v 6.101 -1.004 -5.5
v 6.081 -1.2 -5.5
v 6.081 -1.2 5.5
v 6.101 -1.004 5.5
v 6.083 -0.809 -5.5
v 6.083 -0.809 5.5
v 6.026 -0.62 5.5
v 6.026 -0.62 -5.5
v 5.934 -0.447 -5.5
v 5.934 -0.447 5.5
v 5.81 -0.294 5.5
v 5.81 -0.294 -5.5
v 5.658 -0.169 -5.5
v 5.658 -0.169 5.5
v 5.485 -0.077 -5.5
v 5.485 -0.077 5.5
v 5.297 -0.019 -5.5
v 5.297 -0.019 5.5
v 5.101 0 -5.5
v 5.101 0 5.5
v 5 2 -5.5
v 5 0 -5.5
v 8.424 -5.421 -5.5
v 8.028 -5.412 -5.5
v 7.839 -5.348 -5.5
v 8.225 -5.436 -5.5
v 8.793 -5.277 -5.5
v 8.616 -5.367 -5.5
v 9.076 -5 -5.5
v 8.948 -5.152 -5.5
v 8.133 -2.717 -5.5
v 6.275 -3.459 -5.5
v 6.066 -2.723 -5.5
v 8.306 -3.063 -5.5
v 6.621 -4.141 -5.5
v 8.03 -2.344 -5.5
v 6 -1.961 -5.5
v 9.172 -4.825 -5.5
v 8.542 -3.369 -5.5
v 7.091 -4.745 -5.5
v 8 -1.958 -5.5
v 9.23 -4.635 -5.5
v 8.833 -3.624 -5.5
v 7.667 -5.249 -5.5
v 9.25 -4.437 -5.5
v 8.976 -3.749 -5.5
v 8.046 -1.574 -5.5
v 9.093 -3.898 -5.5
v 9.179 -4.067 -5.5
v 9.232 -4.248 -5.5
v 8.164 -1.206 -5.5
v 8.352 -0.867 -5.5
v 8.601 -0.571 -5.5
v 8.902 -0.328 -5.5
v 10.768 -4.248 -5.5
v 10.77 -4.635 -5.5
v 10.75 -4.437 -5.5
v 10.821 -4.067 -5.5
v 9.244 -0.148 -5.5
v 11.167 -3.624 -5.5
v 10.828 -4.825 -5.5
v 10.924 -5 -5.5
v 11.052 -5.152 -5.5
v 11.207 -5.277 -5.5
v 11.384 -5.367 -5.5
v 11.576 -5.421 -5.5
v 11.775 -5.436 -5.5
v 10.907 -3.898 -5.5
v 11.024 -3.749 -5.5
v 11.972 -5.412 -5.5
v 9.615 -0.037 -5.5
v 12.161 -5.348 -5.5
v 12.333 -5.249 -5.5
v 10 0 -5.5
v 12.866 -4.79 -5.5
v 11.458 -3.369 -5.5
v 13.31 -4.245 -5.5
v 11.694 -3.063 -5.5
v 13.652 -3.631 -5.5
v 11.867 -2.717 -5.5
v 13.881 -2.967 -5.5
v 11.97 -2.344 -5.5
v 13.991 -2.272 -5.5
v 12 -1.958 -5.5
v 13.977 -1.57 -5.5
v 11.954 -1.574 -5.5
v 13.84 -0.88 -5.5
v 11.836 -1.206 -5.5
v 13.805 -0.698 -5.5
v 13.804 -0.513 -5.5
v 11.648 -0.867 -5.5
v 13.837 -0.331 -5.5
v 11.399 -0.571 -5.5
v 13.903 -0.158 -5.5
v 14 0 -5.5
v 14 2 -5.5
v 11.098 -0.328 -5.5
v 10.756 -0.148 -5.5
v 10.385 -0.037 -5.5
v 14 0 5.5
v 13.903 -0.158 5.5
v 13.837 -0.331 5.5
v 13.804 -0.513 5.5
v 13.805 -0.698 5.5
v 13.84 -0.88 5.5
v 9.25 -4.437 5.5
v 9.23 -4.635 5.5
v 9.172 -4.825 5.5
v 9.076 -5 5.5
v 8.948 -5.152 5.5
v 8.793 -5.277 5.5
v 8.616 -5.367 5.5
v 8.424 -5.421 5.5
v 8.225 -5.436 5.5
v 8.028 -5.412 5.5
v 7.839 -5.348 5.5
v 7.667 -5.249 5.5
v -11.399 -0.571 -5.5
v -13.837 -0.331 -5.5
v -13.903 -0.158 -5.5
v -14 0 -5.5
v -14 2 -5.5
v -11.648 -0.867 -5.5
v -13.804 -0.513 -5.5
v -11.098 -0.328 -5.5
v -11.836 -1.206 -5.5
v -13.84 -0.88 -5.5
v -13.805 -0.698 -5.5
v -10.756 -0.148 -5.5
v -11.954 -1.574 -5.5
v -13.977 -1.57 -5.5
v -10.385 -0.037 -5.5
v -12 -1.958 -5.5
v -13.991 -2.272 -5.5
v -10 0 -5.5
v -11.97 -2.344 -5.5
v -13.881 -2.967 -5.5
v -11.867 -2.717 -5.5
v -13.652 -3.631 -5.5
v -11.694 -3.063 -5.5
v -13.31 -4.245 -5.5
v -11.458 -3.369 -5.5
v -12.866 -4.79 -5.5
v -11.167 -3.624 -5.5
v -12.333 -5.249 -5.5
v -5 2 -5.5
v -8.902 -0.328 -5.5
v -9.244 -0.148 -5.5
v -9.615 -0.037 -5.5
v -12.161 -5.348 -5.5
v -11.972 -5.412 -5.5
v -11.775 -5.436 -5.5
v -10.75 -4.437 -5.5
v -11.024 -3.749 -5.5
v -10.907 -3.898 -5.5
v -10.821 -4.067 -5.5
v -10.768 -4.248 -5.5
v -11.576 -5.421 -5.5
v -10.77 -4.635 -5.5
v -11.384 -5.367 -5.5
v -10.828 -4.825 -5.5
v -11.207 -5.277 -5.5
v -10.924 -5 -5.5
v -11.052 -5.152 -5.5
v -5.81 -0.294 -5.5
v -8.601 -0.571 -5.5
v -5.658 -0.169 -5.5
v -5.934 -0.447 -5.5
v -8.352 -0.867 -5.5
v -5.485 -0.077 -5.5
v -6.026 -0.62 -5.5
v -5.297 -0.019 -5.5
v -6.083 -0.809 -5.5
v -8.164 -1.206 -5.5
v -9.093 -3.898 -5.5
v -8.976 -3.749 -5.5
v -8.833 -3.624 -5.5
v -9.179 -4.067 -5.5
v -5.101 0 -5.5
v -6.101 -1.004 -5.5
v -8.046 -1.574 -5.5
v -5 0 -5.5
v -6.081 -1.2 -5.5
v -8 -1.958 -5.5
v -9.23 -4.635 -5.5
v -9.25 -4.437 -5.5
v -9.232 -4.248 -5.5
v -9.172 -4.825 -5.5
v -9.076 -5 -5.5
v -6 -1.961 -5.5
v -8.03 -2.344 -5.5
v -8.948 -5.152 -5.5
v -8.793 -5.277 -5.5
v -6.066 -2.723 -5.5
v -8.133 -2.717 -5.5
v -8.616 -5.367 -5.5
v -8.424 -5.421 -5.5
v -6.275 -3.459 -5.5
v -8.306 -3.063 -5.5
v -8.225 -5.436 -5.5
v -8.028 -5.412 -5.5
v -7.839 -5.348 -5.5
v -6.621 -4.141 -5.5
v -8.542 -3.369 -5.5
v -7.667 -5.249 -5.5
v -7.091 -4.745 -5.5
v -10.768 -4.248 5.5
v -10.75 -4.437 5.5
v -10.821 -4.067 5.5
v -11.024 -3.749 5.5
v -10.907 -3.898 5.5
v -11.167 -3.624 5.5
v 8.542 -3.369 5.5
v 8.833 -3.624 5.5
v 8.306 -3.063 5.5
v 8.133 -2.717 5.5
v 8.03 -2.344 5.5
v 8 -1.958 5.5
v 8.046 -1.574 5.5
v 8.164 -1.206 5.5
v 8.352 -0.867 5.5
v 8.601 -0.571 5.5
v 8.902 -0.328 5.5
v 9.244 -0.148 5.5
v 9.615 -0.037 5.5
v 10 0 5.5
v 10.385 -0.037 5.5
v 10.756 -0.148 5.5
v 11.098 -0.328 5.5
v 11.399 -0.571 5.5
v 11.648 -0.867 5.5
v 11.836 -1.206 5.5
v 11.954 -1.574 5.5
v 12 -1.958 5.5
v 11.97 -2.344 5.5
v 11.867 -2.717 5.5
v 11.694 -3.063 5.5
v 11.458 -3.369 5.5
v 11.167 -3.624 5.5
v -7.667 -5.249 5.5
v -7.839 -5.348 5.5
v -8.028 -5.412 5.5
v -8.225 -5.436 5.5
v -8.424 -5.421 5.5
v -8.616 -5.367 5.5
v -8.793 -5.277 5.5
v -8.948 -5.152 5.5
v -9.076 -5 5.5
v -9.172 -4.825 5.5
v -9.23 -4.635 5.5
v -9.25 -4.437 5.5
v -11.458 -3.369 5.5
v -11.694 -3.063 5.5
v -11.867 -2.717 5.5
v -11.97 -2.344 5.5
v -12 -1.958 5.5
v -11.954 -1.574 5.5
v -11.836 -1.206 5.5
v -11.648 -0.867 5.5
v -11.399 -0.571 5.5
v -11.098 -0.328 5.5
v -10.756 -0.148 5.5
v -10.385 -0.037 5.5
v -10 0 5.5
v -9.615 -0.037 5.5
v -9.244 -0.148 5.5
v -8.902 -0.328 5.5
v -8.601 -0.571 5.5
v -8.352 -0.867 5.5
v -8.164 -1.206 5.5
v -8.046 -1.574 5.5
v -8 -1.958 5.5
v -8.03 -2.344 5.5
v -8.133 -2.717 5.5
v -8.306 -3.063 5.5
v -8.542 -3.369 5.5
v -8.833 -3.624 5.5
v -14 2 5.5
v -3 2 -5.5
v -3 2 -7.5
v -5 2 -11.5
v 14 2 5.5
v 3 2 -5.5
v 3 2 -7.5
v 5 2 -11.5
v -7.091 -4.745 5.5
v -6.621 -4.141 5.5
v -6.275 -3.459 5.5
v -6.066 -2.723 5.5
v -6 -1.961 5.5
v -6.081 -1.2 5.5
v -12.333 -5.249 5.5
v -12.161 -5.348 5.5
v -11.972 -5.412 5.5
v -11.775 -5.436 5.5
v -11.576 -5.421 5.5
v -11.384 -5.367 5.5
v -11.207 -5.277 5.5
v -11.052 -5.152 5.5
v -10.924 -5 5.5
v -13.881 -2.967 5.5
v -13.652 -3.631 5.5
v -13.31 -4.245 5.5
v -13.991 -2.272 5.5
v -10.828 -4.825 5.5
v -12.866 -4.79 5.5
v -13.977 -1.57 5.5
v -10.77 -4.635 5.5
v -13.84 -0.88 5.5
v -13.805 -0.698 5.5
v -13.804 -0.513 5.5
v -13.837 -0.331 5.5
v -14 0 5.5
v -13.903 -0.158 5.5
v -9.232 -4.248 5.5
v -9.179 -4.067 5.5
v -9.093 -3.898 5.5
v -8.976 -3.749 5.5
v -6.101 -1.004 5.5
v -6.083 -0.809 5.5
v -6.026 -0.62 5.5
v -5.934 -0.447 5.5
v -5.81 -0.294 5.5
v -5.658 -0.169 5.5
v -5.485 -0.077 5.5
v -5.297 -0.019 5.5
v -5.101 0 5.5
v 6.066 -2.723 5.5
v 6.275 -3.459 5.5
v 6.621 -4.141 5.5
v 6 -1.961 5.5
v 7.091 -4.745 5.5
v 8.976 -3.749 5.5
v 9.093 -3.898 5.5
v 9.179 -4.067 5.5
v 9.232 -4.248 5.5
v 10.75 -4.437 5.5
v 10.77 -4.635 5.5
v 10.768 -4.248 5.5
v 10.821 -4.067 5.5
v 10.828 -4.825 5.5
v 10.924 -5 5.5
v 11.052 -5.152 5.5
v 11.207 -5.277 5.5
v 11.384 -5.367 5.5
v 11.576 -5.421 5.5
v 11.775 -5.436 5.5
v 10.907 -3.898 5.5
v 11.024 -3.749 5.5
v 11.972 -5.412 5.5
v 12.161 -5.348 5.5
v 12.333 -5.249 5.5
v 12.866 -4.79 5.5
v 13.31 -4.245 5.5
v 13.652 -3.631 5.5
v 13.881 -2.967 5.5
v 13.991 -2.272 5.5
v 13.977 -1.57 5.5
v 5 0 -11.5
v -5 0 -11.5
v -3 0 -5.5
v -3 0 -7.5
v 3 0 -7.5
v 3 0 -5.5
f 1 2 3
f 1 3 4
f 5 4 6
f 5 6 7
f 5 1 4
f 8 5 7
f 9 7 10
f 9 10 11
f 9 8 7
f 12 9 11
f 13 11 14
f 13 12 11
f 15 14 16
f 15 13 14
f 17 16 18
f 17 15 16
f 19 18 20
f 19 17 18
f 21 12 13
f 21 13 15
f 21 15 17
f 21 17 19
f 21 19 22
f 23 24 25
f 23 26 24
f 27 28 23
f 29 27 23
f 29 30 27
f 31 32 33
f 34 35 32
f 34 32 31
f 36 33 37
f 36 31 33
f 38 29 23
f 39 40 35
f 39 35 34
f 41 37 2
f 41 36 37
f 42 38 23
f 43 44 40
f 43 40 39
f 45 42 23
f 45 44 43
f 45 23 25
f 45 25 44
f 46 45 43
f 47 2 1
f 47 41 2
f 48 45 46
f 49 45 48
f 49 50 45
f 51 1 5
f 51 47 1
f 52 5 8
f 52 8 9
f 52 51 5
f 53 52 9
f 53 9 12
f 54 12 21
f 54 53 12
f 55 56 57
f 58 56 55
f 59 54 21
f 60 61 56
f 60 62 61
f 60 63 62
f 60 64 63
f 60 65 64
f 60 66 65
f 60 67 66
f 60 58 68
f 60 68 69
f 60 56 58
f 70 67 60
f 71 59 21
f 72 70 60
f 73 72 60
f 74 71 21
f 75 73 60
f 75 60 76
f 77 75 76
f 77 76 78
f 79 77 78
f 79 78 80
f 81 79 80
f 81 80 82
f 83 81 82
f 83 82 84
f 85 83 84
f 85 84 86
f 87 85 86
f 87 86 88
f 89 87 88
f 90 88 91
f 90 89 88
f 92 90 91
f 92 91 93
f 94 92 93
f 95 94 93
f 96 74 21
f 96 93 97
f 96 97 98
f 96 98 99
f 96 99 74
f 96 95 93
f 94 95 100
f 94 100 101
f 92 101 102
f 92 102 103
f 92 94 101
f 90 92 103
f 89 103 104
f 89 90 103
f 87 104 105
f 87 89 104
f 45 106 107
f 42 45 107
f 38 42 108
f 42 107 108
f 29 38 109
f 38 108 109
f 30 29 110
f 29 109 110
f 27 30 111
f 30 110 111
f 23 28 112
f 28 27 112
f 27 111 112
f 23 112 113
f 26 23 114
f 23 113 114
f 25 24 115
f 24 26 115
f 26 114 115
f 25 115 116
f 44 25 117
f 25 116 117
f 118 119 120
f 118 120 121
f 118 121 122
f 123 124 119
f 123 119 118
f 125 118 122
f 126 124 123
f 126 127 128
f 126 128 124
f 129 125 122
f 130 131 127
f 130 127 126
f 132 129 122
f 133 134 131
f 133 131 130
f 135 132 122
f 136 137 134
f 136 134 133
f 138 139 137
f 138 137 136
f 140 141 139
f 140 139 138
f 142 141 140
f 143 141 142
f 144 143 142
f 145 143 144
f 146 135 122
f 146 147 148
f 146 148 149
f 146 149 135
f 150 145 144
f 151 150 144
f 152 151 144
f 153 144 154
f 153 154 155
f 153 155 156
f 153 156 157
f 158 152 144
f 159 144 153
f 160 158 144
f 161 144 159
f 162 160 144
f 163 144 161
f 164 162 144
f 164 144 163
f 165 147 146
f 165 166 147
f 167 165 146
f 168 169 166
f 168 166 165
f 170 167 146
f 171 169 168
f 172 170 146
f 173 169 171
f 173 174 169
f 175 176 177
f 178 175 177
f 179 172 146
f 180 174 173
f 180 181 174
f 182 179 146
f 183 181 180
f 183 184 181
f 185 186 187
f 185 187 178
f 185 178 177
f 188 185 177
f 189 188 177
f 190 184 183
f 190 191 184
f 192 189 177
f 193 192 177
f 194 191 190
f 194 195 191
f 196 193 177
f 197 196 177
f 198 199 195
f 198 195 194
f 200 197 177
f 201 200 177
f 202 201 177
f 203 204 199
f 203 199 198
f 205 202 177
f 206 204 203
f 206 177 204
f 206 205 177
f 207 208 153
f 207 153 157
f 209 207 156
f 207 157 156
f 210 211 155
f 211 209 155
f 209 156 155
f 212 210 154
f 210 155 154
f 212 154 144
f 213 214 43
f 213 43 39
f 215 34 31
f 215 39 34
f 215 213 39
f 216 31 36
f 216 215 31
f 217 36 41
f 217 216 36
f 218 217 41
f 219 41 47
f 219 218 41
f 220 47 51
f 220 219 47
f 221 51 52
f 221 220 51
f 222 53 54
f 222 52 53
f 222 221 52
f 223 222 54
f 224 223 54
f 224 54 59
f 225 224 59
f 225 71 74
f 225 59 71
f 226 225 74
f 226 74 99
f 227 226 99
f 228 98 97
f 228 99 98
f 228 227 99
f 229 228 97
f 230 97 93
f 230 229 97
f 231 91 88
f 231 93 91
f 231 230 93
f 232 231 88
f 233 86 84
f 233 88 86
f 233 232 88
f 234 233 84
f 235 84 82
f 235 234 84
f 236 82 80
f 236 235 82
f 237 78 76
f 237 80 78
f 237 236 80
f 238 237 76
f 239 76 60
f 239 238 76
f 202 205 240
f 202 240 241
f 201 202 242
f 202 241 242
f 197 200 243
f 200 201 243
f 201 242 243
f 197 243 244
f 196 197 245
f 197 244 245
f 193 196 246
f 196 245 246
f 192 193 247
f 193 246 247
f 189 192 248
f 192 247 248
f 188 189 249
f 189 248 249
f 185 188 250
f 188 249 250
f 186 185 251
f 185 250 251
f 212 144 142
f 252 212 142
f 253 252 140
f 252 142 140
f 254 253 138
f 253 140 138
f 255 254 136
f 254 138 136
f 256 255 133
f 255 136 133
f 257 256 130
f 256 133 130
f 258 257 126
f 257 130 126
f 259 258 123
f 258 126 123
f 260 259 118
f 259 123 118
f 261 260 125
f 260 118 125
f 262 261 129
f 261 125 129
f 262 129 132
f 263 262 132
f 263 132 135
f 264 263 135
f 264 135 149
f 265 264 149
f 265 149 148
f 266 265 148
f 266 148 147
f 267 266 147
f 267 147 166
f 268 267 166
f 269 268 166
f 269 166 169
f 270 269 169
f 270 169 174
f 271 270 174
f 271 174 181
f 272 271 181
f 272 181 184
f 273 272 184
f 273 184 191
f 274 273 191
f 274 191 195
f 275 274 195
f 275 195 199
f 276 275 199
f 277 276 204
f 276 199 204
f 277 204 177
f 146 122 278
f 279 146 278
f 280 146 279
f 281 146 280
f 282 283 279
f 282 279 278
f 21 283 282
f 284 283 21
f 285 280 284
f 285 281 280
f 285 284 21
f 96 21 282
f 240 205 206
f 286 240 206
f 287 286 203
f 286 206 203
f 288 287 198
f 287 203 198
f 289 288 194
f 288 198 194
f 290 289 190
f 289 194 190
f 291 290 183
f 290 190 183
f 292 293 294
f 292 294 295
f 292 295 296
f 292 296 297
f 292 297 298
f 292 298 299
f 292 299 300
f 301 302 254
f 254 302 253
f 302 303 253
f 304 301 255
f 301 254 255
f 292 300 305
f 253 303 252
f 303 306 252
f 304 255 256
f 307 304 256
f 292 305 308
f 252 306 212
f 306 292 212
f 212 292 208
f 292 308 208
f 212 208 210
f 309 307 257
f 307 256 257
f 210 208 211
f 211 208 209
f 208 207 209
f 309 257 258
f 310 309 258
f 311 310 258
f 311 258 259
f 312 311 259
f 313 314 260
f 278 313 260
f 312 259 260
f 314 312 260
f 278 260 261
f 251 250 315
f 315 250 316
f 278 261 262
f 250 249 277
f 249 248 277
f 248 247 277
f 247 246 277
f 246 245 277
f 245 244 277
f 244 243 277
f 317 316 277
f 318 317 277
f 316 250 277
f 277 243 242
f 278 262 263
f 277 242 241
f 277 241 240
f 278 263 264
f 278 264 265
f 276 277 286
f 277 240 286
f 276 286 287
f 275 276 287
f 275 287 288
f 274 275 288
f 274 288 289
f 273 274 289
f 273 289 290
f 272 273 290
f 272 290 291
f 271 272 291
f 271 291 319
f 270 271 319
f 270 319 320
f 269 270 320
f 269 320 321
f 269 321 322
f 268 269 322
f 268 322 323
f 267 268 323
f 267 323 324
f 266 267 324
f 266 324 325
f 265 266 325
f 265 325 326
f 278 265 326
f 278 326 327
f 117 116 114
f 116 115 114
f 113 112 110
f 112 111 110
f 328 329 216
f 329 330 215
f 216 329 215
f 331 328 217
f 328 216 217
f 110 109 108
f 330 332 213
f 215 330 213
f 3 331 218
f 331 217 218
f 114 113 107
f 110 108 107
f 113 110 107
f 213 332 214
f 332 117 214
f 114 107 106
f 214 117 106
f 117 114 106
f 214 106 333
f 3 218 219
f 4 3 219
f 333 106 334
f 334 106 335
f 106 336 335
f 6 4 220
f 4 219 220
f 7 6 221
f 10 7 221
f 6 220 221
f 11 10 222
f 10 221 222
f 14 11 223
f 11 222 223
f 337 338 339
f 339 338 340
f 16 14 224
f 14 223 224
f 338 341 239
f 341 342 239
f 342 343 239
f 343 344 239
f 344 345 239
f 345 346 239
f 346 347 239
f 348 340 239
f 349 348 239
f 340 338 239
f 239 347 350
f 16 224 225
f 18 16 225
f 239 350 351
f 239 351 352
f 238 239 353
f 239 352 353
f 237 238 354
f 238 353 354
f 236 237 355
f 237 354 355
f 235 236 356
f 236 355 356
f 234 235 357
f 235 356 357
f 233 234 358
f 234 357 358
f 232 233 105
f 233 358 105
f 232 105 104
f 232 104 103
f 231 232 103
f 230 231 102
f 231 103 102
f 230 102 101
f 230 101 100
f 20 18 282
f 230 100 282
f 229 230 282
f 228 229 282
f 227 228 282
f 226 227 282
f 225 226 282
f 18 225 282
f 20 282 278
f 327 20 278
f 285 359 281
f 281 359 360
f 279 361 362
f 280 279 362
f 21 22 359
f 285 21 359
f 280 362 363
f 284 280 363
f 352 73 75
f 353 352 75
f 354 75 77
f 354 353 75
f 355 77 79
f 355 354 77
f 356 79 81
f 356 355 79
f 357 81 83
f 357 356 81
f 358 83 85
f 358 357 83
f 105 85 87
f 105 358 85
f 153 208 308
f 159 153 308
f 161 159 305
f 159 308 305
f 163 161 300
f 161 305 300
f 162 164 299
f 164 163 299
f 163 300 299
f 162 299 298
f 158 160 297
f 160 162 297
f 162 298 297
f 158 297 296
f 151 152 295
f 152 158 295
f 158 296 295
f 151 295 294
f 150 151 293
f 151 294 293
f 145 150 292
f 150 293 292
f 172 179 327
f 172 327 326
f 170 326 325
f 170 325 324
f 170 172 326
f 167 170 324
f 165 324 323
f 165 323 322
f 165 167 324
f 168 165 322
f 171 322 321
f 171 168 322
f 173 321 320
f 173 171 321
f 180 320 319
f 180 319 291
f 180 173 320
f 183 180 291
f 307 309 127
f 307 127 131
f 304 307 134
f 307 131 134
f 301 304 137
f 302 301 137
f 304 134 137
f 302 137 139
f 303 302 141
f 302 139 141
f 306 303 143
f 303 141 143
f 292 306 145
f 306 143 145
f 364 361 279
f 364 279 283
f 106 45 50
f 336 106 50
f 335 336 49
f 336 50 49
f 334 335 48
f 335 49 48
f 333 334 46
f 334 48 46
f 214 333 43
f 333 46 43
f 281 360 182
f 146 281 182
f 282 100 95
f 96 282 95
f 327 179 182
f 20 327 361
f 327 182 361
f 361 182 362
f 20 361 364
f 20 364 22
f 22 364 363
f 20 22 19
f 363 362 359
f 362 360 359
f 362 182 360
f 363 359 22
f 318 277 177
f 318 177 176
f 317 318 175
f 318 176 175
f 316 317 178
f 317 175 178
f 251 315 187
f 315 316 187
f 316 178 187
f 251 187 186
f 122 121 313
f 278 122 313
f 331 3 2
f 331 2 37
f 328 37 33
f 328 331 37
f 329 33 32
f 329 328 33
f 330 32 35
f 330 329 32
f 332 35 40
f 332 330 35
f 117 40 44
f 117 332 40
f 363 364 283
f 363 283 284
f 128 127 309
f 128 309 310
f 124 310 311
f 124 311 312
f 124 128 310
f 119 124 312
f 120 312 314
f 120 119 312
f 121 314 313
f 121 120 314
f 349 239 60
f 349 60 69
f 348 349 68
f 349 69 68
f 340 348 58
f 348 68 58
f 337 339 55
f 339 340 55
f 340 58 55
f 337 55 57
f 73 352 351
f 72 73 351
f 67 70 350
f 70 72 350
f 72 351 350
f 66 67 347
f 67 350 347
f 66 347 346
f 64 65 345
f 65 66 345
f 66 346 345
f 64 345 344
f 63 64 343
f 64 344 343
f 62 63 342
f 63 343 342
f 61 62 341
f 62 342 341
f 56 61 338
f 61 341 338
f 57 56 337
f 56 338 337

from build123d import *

# Parameters (mm, degrees)
SKETCH1_W           = 6
SKETCH1_H           = 2
BOSS_EXTRUDE1_DEPTH = 2
BOSS_EXTRUDE2_DEPTH = 5.5
FILLET1_R           = 1


with BuildPart() as part:
    # Sketch1 → Boss-Extrude1 (new body)
    with BuildSketch(Plane(origin=(0, 0, 0), x_dir=(1, 0, 0), z_dir=(0, 1, 0))):
        Polygon((-14, 5.5), (-14, -5.5), (14, -5.5), (14, 5.5), (5, 5.5), (5, 11.5), (-5, 11.5), (-5, 5.5), align=None)
        with Locations((0, 6.5)):
            Rectangle(SKETCH1_W, SKETCH1_H, mode=Mode.SUBTRACT)
    extrude(amount=BOSS_EXTRUDE1_DEPTH)

    # Sketch2 → Boss-Extrude2 (add, symmetric)
    with BuildSketch(Plane.XY):
        with BuildLine():
            Line((-10.75, -5.929058411), (-10.75, -3.854049622))
            ThreePointArc((-10.75, -3.854049622), (-10, 0), (-9.25, -3.854049622))
            Line((-9.25, -3.854049622), (-9.25, -5.929058411))
            ThreePointArc((-9.25, -5.929058411), (-10, 2), (-10.75, -5.929058411))
        make_face()
        with BuildLine():
            Line((9.25, -5.929058411), (9.25, -3.854049622))
            ThreePointArc((9.25, -3.854049622), (10, 0), (10.75, -3.854049622))
            Line((10.75, -3.854049622), (10.75, -5.929058411))
            ThreePointArc((10.75, -5.929058411), (10, 2), (9.25, -5.929058411))
        make_face()
    extrude(amount=BOSS_EXTRUDE2_DEPTH, both=True)

    # Fillet1
    # the kernel refuses this fillet: 1 mm, written as the material it adds along each edge
    with BuildSketch(Plane(origin=(-6.535898385, 0, -5.5), x_dir=(0.3545926272330996, -0.9350208921259076, 0), z_dir=(0, 0, 1))) as fillet1_piece_1:
        with BuildLine():
            CenterArc((1.443818006, 0.987048159), FILLET1_R, 159.231520484, 101.536959033)
            Line((0.508797114, 1.341640786), (0, 0))
            ThreePointArc((0, 0), (0.641696892, 0.051807363), (1.283393783, 0))
        make_face()
    extrude(amount=11)
    with BuildSketch(Plane(origin=(-13.464101615, 0, -5.5), x_dir=(-1, 0, 0), z_dir=(0, 0, 1))) as fillet1_piece_2:
        with BuildLine():
            CenterArc((1.335898385, 0.6), FILLET1_R, 163.739795292, 53.130102354)
            ThreePointArc((0.375898385, 0.88), (0.214359354, 0.428718708), (0, 0))
            Line((0, 0), (0.535898385, 0))
        make_face()
    extrude(amount=11)
    with BuildSketch(Plane(origin=(13.464101615, 0, -5.5), x_dir=(1, 0, 0), z_dir=(0, 0, 1))) as fillet1_piece_3:
        with BuildLine():
            CenterArc((1.335898385, -0.6), FILLET1_R, 143.130102354, 53.130102354)
            ThreePointArc((0.375898385, -0.88), (0.214359354, -0.428718708), (0, 0))
            Line((0, 0), (0.535898385, 0))
        make_face()
    extrude(amount=11)
    with BuildSketch(Plane(origin=(6.535898385, 0, -5.5), x_dir=(-0.3545926272330986, -0.935020892125908, 0), z_dir=(0, 0, 1))) as fillet1_piece_4:
        with BuildLine():
            CenterArc((1.443818006, -0.987048159), FILLET1_R, 99.231520484, 101.536959033)
            Line((0.508797114, -1.341640786), (0, 0))
            ThreePointArc((0, 0), (0.641696892, -0.051807363), (1.283393783, 0))
        make_face()
    extrude(amount=11)
    # the kernel refuses this fillet: 1 mm, written as the material it takes off along each edge
    with BuildSketch(Plane(origin=(10.75, -5.929058411, 9.808071734), x_dir=(0, 1, 0), z_dir=(0, 0, -1))) as fillet1_2_piece_1:
        with BuildLine():
            CenterArc((1.492359825, 1), FILLET1_R, 144.314665287, 125.685334713)
            ThreePointArc((0.680126963, 1.583333333), (0.253786895, 0.828727108), (0, 0))
            Line((0, 0), (1.492359825, 0))
        make_face()
    extrude(amount=19.616143468, mode=Mode.SUBTRACT)
    with BuildSketch(Plane(origin=(10.75, -3.854049622, -6.956622411), x_dir=(0.8758453103585752, 0.48259195219449225, 0), z_dir=(0, 0, 1))) as fillet1_2_piece_2:
        with BuildLine():
            CenterArc((0.594663609, -0.992902315), FILLET1_R, 96.830510938, 54.314665287)
            Line((-0.281181701, -0.510310363), (0, 0))
            ThreePointArc((0, 0), (0.237865444, -0.014195369), (0.475730887, 0))
        make_face()
    extrude(amount=13.913244822, mode=Mode.SUBTRACT)
    with BuildSketch(Plane(origin=(9.25, -5.929058411, 9.808071734), x_dir=(-0.9188178790368026, 0.39468177708416147, 0), z_dir=(0, 0, -1))) as fillet1_2_piece_3:
        with BuildLine():
            CenterArc((1.507825107, 0.976525112), FILLET1_R, 156.753871206, 125.685334713)
            Line((0.589007228, 1.371206889), (0, 0))
            ThreePointArc((0, 0), (0.861614347, -0.093899551), (1.723228694, 0))
        make_face()
    extrude(amount=19.616143468, mode=Mode.SUBTRACT)
    with BuildSketch(Plane(origin=(9.25, -3.854049622, -6.956622411), x_dir=(0, -1, 0), z_dir=(0, 0, 1))) as fillet1_2_piece_4:
        with BuildLine():
            CenterArc((0.582648964, -1), FILLET1_R, 90, 54.314665287)
            ThreePointArc((-0.229583898, -0.416666667), (-0.102359001, -0.215183904), (0, 0))
            Line((0, 0), (0.582648964, 0))
        make_face()
    extrude(amount=13.913244822, mode=Mode.SUBTRACT)
    with BuildSketch(Plane(origin=(-9.25, -3.854049622, -6.956622411), x_dir=(0, -1, 0), z_dir=(0, 0, 1))) as fillet1_2_piece_5:
        with BuildLine():
            CenterArc((0.582648964, 1), FILLET1_R, 215.685334713, 54.314665287)
            ThreePointArc((-0.229583898, 0.416666667), (-0.102359001, 0.215183904), (0, 0))
            Line((0, 0), (0.582648964, 0))
        make_face()
    extrude(amount=13.913244822, mode=Mode.SUBTRACT)
    with BuildSketch(Plane(origin=(-10.75, -3.854049622, -6.956622411), x_dir=(-0.8758453103585743, 0.4825919521944938, 0), z_dir=(0, 0, 1))) as fillet1_2_piece_6:
        with BuildLine():
            CenterArc((0.594663609, 0.992902315), FILLET1_R, 208.854823775, 54.314665287)
            Line((-0.281181701, 0.510310363), (0, 0))
            ThreePointArc((0, 0), (0.237865444, 0.014195369), (0.475730887, 0))
        make_face()
    extrude(amount=13.913244822, mode=Mode.SUBTRACT)
    with BuildSketch(Plane(origin=(-9.25, -5.929058411, 9.808071734), x_dir=(0.9188178790368028, 0.3946817770841608, 0), z_dir=(0, 0, -1))) as fillet1_2_piece_7:
        with BuildLine():
            CenterArc((1.507825107, -0.976525112), FILLET1_R, 77.560794081, 125.685334713)
            Line((0.589007228, -1.371206889), (0, 0))
            ThreePointArc((0, 0), (0.861614347, 0.093899551), (1.723228694, 0))
        make_face()
    extrude(amount=19.616143468, mode=Mode.SUBTRACT)
    with BuildSketch(Plane(origin=(-10.75, -5.929058411, 9.808071734), x_dir=(0, 1, 0), z_dir=(0, 0, -1))) as fillet1_2_piece_8:
        with BuildLine():
            CenterArc((1.492359825, -1), FILLET1_R, 90, 125.685334713)
            ThreePointArc((0.680126963, -1.583333333), (0.253786895, -0.828727108), (0, 0))
            Line((0, 0), (1.492359825, 0))
        make_face()
    extrude(amount=19.616143468, mode=Mode.SUBTRACT)


solid = part.part
